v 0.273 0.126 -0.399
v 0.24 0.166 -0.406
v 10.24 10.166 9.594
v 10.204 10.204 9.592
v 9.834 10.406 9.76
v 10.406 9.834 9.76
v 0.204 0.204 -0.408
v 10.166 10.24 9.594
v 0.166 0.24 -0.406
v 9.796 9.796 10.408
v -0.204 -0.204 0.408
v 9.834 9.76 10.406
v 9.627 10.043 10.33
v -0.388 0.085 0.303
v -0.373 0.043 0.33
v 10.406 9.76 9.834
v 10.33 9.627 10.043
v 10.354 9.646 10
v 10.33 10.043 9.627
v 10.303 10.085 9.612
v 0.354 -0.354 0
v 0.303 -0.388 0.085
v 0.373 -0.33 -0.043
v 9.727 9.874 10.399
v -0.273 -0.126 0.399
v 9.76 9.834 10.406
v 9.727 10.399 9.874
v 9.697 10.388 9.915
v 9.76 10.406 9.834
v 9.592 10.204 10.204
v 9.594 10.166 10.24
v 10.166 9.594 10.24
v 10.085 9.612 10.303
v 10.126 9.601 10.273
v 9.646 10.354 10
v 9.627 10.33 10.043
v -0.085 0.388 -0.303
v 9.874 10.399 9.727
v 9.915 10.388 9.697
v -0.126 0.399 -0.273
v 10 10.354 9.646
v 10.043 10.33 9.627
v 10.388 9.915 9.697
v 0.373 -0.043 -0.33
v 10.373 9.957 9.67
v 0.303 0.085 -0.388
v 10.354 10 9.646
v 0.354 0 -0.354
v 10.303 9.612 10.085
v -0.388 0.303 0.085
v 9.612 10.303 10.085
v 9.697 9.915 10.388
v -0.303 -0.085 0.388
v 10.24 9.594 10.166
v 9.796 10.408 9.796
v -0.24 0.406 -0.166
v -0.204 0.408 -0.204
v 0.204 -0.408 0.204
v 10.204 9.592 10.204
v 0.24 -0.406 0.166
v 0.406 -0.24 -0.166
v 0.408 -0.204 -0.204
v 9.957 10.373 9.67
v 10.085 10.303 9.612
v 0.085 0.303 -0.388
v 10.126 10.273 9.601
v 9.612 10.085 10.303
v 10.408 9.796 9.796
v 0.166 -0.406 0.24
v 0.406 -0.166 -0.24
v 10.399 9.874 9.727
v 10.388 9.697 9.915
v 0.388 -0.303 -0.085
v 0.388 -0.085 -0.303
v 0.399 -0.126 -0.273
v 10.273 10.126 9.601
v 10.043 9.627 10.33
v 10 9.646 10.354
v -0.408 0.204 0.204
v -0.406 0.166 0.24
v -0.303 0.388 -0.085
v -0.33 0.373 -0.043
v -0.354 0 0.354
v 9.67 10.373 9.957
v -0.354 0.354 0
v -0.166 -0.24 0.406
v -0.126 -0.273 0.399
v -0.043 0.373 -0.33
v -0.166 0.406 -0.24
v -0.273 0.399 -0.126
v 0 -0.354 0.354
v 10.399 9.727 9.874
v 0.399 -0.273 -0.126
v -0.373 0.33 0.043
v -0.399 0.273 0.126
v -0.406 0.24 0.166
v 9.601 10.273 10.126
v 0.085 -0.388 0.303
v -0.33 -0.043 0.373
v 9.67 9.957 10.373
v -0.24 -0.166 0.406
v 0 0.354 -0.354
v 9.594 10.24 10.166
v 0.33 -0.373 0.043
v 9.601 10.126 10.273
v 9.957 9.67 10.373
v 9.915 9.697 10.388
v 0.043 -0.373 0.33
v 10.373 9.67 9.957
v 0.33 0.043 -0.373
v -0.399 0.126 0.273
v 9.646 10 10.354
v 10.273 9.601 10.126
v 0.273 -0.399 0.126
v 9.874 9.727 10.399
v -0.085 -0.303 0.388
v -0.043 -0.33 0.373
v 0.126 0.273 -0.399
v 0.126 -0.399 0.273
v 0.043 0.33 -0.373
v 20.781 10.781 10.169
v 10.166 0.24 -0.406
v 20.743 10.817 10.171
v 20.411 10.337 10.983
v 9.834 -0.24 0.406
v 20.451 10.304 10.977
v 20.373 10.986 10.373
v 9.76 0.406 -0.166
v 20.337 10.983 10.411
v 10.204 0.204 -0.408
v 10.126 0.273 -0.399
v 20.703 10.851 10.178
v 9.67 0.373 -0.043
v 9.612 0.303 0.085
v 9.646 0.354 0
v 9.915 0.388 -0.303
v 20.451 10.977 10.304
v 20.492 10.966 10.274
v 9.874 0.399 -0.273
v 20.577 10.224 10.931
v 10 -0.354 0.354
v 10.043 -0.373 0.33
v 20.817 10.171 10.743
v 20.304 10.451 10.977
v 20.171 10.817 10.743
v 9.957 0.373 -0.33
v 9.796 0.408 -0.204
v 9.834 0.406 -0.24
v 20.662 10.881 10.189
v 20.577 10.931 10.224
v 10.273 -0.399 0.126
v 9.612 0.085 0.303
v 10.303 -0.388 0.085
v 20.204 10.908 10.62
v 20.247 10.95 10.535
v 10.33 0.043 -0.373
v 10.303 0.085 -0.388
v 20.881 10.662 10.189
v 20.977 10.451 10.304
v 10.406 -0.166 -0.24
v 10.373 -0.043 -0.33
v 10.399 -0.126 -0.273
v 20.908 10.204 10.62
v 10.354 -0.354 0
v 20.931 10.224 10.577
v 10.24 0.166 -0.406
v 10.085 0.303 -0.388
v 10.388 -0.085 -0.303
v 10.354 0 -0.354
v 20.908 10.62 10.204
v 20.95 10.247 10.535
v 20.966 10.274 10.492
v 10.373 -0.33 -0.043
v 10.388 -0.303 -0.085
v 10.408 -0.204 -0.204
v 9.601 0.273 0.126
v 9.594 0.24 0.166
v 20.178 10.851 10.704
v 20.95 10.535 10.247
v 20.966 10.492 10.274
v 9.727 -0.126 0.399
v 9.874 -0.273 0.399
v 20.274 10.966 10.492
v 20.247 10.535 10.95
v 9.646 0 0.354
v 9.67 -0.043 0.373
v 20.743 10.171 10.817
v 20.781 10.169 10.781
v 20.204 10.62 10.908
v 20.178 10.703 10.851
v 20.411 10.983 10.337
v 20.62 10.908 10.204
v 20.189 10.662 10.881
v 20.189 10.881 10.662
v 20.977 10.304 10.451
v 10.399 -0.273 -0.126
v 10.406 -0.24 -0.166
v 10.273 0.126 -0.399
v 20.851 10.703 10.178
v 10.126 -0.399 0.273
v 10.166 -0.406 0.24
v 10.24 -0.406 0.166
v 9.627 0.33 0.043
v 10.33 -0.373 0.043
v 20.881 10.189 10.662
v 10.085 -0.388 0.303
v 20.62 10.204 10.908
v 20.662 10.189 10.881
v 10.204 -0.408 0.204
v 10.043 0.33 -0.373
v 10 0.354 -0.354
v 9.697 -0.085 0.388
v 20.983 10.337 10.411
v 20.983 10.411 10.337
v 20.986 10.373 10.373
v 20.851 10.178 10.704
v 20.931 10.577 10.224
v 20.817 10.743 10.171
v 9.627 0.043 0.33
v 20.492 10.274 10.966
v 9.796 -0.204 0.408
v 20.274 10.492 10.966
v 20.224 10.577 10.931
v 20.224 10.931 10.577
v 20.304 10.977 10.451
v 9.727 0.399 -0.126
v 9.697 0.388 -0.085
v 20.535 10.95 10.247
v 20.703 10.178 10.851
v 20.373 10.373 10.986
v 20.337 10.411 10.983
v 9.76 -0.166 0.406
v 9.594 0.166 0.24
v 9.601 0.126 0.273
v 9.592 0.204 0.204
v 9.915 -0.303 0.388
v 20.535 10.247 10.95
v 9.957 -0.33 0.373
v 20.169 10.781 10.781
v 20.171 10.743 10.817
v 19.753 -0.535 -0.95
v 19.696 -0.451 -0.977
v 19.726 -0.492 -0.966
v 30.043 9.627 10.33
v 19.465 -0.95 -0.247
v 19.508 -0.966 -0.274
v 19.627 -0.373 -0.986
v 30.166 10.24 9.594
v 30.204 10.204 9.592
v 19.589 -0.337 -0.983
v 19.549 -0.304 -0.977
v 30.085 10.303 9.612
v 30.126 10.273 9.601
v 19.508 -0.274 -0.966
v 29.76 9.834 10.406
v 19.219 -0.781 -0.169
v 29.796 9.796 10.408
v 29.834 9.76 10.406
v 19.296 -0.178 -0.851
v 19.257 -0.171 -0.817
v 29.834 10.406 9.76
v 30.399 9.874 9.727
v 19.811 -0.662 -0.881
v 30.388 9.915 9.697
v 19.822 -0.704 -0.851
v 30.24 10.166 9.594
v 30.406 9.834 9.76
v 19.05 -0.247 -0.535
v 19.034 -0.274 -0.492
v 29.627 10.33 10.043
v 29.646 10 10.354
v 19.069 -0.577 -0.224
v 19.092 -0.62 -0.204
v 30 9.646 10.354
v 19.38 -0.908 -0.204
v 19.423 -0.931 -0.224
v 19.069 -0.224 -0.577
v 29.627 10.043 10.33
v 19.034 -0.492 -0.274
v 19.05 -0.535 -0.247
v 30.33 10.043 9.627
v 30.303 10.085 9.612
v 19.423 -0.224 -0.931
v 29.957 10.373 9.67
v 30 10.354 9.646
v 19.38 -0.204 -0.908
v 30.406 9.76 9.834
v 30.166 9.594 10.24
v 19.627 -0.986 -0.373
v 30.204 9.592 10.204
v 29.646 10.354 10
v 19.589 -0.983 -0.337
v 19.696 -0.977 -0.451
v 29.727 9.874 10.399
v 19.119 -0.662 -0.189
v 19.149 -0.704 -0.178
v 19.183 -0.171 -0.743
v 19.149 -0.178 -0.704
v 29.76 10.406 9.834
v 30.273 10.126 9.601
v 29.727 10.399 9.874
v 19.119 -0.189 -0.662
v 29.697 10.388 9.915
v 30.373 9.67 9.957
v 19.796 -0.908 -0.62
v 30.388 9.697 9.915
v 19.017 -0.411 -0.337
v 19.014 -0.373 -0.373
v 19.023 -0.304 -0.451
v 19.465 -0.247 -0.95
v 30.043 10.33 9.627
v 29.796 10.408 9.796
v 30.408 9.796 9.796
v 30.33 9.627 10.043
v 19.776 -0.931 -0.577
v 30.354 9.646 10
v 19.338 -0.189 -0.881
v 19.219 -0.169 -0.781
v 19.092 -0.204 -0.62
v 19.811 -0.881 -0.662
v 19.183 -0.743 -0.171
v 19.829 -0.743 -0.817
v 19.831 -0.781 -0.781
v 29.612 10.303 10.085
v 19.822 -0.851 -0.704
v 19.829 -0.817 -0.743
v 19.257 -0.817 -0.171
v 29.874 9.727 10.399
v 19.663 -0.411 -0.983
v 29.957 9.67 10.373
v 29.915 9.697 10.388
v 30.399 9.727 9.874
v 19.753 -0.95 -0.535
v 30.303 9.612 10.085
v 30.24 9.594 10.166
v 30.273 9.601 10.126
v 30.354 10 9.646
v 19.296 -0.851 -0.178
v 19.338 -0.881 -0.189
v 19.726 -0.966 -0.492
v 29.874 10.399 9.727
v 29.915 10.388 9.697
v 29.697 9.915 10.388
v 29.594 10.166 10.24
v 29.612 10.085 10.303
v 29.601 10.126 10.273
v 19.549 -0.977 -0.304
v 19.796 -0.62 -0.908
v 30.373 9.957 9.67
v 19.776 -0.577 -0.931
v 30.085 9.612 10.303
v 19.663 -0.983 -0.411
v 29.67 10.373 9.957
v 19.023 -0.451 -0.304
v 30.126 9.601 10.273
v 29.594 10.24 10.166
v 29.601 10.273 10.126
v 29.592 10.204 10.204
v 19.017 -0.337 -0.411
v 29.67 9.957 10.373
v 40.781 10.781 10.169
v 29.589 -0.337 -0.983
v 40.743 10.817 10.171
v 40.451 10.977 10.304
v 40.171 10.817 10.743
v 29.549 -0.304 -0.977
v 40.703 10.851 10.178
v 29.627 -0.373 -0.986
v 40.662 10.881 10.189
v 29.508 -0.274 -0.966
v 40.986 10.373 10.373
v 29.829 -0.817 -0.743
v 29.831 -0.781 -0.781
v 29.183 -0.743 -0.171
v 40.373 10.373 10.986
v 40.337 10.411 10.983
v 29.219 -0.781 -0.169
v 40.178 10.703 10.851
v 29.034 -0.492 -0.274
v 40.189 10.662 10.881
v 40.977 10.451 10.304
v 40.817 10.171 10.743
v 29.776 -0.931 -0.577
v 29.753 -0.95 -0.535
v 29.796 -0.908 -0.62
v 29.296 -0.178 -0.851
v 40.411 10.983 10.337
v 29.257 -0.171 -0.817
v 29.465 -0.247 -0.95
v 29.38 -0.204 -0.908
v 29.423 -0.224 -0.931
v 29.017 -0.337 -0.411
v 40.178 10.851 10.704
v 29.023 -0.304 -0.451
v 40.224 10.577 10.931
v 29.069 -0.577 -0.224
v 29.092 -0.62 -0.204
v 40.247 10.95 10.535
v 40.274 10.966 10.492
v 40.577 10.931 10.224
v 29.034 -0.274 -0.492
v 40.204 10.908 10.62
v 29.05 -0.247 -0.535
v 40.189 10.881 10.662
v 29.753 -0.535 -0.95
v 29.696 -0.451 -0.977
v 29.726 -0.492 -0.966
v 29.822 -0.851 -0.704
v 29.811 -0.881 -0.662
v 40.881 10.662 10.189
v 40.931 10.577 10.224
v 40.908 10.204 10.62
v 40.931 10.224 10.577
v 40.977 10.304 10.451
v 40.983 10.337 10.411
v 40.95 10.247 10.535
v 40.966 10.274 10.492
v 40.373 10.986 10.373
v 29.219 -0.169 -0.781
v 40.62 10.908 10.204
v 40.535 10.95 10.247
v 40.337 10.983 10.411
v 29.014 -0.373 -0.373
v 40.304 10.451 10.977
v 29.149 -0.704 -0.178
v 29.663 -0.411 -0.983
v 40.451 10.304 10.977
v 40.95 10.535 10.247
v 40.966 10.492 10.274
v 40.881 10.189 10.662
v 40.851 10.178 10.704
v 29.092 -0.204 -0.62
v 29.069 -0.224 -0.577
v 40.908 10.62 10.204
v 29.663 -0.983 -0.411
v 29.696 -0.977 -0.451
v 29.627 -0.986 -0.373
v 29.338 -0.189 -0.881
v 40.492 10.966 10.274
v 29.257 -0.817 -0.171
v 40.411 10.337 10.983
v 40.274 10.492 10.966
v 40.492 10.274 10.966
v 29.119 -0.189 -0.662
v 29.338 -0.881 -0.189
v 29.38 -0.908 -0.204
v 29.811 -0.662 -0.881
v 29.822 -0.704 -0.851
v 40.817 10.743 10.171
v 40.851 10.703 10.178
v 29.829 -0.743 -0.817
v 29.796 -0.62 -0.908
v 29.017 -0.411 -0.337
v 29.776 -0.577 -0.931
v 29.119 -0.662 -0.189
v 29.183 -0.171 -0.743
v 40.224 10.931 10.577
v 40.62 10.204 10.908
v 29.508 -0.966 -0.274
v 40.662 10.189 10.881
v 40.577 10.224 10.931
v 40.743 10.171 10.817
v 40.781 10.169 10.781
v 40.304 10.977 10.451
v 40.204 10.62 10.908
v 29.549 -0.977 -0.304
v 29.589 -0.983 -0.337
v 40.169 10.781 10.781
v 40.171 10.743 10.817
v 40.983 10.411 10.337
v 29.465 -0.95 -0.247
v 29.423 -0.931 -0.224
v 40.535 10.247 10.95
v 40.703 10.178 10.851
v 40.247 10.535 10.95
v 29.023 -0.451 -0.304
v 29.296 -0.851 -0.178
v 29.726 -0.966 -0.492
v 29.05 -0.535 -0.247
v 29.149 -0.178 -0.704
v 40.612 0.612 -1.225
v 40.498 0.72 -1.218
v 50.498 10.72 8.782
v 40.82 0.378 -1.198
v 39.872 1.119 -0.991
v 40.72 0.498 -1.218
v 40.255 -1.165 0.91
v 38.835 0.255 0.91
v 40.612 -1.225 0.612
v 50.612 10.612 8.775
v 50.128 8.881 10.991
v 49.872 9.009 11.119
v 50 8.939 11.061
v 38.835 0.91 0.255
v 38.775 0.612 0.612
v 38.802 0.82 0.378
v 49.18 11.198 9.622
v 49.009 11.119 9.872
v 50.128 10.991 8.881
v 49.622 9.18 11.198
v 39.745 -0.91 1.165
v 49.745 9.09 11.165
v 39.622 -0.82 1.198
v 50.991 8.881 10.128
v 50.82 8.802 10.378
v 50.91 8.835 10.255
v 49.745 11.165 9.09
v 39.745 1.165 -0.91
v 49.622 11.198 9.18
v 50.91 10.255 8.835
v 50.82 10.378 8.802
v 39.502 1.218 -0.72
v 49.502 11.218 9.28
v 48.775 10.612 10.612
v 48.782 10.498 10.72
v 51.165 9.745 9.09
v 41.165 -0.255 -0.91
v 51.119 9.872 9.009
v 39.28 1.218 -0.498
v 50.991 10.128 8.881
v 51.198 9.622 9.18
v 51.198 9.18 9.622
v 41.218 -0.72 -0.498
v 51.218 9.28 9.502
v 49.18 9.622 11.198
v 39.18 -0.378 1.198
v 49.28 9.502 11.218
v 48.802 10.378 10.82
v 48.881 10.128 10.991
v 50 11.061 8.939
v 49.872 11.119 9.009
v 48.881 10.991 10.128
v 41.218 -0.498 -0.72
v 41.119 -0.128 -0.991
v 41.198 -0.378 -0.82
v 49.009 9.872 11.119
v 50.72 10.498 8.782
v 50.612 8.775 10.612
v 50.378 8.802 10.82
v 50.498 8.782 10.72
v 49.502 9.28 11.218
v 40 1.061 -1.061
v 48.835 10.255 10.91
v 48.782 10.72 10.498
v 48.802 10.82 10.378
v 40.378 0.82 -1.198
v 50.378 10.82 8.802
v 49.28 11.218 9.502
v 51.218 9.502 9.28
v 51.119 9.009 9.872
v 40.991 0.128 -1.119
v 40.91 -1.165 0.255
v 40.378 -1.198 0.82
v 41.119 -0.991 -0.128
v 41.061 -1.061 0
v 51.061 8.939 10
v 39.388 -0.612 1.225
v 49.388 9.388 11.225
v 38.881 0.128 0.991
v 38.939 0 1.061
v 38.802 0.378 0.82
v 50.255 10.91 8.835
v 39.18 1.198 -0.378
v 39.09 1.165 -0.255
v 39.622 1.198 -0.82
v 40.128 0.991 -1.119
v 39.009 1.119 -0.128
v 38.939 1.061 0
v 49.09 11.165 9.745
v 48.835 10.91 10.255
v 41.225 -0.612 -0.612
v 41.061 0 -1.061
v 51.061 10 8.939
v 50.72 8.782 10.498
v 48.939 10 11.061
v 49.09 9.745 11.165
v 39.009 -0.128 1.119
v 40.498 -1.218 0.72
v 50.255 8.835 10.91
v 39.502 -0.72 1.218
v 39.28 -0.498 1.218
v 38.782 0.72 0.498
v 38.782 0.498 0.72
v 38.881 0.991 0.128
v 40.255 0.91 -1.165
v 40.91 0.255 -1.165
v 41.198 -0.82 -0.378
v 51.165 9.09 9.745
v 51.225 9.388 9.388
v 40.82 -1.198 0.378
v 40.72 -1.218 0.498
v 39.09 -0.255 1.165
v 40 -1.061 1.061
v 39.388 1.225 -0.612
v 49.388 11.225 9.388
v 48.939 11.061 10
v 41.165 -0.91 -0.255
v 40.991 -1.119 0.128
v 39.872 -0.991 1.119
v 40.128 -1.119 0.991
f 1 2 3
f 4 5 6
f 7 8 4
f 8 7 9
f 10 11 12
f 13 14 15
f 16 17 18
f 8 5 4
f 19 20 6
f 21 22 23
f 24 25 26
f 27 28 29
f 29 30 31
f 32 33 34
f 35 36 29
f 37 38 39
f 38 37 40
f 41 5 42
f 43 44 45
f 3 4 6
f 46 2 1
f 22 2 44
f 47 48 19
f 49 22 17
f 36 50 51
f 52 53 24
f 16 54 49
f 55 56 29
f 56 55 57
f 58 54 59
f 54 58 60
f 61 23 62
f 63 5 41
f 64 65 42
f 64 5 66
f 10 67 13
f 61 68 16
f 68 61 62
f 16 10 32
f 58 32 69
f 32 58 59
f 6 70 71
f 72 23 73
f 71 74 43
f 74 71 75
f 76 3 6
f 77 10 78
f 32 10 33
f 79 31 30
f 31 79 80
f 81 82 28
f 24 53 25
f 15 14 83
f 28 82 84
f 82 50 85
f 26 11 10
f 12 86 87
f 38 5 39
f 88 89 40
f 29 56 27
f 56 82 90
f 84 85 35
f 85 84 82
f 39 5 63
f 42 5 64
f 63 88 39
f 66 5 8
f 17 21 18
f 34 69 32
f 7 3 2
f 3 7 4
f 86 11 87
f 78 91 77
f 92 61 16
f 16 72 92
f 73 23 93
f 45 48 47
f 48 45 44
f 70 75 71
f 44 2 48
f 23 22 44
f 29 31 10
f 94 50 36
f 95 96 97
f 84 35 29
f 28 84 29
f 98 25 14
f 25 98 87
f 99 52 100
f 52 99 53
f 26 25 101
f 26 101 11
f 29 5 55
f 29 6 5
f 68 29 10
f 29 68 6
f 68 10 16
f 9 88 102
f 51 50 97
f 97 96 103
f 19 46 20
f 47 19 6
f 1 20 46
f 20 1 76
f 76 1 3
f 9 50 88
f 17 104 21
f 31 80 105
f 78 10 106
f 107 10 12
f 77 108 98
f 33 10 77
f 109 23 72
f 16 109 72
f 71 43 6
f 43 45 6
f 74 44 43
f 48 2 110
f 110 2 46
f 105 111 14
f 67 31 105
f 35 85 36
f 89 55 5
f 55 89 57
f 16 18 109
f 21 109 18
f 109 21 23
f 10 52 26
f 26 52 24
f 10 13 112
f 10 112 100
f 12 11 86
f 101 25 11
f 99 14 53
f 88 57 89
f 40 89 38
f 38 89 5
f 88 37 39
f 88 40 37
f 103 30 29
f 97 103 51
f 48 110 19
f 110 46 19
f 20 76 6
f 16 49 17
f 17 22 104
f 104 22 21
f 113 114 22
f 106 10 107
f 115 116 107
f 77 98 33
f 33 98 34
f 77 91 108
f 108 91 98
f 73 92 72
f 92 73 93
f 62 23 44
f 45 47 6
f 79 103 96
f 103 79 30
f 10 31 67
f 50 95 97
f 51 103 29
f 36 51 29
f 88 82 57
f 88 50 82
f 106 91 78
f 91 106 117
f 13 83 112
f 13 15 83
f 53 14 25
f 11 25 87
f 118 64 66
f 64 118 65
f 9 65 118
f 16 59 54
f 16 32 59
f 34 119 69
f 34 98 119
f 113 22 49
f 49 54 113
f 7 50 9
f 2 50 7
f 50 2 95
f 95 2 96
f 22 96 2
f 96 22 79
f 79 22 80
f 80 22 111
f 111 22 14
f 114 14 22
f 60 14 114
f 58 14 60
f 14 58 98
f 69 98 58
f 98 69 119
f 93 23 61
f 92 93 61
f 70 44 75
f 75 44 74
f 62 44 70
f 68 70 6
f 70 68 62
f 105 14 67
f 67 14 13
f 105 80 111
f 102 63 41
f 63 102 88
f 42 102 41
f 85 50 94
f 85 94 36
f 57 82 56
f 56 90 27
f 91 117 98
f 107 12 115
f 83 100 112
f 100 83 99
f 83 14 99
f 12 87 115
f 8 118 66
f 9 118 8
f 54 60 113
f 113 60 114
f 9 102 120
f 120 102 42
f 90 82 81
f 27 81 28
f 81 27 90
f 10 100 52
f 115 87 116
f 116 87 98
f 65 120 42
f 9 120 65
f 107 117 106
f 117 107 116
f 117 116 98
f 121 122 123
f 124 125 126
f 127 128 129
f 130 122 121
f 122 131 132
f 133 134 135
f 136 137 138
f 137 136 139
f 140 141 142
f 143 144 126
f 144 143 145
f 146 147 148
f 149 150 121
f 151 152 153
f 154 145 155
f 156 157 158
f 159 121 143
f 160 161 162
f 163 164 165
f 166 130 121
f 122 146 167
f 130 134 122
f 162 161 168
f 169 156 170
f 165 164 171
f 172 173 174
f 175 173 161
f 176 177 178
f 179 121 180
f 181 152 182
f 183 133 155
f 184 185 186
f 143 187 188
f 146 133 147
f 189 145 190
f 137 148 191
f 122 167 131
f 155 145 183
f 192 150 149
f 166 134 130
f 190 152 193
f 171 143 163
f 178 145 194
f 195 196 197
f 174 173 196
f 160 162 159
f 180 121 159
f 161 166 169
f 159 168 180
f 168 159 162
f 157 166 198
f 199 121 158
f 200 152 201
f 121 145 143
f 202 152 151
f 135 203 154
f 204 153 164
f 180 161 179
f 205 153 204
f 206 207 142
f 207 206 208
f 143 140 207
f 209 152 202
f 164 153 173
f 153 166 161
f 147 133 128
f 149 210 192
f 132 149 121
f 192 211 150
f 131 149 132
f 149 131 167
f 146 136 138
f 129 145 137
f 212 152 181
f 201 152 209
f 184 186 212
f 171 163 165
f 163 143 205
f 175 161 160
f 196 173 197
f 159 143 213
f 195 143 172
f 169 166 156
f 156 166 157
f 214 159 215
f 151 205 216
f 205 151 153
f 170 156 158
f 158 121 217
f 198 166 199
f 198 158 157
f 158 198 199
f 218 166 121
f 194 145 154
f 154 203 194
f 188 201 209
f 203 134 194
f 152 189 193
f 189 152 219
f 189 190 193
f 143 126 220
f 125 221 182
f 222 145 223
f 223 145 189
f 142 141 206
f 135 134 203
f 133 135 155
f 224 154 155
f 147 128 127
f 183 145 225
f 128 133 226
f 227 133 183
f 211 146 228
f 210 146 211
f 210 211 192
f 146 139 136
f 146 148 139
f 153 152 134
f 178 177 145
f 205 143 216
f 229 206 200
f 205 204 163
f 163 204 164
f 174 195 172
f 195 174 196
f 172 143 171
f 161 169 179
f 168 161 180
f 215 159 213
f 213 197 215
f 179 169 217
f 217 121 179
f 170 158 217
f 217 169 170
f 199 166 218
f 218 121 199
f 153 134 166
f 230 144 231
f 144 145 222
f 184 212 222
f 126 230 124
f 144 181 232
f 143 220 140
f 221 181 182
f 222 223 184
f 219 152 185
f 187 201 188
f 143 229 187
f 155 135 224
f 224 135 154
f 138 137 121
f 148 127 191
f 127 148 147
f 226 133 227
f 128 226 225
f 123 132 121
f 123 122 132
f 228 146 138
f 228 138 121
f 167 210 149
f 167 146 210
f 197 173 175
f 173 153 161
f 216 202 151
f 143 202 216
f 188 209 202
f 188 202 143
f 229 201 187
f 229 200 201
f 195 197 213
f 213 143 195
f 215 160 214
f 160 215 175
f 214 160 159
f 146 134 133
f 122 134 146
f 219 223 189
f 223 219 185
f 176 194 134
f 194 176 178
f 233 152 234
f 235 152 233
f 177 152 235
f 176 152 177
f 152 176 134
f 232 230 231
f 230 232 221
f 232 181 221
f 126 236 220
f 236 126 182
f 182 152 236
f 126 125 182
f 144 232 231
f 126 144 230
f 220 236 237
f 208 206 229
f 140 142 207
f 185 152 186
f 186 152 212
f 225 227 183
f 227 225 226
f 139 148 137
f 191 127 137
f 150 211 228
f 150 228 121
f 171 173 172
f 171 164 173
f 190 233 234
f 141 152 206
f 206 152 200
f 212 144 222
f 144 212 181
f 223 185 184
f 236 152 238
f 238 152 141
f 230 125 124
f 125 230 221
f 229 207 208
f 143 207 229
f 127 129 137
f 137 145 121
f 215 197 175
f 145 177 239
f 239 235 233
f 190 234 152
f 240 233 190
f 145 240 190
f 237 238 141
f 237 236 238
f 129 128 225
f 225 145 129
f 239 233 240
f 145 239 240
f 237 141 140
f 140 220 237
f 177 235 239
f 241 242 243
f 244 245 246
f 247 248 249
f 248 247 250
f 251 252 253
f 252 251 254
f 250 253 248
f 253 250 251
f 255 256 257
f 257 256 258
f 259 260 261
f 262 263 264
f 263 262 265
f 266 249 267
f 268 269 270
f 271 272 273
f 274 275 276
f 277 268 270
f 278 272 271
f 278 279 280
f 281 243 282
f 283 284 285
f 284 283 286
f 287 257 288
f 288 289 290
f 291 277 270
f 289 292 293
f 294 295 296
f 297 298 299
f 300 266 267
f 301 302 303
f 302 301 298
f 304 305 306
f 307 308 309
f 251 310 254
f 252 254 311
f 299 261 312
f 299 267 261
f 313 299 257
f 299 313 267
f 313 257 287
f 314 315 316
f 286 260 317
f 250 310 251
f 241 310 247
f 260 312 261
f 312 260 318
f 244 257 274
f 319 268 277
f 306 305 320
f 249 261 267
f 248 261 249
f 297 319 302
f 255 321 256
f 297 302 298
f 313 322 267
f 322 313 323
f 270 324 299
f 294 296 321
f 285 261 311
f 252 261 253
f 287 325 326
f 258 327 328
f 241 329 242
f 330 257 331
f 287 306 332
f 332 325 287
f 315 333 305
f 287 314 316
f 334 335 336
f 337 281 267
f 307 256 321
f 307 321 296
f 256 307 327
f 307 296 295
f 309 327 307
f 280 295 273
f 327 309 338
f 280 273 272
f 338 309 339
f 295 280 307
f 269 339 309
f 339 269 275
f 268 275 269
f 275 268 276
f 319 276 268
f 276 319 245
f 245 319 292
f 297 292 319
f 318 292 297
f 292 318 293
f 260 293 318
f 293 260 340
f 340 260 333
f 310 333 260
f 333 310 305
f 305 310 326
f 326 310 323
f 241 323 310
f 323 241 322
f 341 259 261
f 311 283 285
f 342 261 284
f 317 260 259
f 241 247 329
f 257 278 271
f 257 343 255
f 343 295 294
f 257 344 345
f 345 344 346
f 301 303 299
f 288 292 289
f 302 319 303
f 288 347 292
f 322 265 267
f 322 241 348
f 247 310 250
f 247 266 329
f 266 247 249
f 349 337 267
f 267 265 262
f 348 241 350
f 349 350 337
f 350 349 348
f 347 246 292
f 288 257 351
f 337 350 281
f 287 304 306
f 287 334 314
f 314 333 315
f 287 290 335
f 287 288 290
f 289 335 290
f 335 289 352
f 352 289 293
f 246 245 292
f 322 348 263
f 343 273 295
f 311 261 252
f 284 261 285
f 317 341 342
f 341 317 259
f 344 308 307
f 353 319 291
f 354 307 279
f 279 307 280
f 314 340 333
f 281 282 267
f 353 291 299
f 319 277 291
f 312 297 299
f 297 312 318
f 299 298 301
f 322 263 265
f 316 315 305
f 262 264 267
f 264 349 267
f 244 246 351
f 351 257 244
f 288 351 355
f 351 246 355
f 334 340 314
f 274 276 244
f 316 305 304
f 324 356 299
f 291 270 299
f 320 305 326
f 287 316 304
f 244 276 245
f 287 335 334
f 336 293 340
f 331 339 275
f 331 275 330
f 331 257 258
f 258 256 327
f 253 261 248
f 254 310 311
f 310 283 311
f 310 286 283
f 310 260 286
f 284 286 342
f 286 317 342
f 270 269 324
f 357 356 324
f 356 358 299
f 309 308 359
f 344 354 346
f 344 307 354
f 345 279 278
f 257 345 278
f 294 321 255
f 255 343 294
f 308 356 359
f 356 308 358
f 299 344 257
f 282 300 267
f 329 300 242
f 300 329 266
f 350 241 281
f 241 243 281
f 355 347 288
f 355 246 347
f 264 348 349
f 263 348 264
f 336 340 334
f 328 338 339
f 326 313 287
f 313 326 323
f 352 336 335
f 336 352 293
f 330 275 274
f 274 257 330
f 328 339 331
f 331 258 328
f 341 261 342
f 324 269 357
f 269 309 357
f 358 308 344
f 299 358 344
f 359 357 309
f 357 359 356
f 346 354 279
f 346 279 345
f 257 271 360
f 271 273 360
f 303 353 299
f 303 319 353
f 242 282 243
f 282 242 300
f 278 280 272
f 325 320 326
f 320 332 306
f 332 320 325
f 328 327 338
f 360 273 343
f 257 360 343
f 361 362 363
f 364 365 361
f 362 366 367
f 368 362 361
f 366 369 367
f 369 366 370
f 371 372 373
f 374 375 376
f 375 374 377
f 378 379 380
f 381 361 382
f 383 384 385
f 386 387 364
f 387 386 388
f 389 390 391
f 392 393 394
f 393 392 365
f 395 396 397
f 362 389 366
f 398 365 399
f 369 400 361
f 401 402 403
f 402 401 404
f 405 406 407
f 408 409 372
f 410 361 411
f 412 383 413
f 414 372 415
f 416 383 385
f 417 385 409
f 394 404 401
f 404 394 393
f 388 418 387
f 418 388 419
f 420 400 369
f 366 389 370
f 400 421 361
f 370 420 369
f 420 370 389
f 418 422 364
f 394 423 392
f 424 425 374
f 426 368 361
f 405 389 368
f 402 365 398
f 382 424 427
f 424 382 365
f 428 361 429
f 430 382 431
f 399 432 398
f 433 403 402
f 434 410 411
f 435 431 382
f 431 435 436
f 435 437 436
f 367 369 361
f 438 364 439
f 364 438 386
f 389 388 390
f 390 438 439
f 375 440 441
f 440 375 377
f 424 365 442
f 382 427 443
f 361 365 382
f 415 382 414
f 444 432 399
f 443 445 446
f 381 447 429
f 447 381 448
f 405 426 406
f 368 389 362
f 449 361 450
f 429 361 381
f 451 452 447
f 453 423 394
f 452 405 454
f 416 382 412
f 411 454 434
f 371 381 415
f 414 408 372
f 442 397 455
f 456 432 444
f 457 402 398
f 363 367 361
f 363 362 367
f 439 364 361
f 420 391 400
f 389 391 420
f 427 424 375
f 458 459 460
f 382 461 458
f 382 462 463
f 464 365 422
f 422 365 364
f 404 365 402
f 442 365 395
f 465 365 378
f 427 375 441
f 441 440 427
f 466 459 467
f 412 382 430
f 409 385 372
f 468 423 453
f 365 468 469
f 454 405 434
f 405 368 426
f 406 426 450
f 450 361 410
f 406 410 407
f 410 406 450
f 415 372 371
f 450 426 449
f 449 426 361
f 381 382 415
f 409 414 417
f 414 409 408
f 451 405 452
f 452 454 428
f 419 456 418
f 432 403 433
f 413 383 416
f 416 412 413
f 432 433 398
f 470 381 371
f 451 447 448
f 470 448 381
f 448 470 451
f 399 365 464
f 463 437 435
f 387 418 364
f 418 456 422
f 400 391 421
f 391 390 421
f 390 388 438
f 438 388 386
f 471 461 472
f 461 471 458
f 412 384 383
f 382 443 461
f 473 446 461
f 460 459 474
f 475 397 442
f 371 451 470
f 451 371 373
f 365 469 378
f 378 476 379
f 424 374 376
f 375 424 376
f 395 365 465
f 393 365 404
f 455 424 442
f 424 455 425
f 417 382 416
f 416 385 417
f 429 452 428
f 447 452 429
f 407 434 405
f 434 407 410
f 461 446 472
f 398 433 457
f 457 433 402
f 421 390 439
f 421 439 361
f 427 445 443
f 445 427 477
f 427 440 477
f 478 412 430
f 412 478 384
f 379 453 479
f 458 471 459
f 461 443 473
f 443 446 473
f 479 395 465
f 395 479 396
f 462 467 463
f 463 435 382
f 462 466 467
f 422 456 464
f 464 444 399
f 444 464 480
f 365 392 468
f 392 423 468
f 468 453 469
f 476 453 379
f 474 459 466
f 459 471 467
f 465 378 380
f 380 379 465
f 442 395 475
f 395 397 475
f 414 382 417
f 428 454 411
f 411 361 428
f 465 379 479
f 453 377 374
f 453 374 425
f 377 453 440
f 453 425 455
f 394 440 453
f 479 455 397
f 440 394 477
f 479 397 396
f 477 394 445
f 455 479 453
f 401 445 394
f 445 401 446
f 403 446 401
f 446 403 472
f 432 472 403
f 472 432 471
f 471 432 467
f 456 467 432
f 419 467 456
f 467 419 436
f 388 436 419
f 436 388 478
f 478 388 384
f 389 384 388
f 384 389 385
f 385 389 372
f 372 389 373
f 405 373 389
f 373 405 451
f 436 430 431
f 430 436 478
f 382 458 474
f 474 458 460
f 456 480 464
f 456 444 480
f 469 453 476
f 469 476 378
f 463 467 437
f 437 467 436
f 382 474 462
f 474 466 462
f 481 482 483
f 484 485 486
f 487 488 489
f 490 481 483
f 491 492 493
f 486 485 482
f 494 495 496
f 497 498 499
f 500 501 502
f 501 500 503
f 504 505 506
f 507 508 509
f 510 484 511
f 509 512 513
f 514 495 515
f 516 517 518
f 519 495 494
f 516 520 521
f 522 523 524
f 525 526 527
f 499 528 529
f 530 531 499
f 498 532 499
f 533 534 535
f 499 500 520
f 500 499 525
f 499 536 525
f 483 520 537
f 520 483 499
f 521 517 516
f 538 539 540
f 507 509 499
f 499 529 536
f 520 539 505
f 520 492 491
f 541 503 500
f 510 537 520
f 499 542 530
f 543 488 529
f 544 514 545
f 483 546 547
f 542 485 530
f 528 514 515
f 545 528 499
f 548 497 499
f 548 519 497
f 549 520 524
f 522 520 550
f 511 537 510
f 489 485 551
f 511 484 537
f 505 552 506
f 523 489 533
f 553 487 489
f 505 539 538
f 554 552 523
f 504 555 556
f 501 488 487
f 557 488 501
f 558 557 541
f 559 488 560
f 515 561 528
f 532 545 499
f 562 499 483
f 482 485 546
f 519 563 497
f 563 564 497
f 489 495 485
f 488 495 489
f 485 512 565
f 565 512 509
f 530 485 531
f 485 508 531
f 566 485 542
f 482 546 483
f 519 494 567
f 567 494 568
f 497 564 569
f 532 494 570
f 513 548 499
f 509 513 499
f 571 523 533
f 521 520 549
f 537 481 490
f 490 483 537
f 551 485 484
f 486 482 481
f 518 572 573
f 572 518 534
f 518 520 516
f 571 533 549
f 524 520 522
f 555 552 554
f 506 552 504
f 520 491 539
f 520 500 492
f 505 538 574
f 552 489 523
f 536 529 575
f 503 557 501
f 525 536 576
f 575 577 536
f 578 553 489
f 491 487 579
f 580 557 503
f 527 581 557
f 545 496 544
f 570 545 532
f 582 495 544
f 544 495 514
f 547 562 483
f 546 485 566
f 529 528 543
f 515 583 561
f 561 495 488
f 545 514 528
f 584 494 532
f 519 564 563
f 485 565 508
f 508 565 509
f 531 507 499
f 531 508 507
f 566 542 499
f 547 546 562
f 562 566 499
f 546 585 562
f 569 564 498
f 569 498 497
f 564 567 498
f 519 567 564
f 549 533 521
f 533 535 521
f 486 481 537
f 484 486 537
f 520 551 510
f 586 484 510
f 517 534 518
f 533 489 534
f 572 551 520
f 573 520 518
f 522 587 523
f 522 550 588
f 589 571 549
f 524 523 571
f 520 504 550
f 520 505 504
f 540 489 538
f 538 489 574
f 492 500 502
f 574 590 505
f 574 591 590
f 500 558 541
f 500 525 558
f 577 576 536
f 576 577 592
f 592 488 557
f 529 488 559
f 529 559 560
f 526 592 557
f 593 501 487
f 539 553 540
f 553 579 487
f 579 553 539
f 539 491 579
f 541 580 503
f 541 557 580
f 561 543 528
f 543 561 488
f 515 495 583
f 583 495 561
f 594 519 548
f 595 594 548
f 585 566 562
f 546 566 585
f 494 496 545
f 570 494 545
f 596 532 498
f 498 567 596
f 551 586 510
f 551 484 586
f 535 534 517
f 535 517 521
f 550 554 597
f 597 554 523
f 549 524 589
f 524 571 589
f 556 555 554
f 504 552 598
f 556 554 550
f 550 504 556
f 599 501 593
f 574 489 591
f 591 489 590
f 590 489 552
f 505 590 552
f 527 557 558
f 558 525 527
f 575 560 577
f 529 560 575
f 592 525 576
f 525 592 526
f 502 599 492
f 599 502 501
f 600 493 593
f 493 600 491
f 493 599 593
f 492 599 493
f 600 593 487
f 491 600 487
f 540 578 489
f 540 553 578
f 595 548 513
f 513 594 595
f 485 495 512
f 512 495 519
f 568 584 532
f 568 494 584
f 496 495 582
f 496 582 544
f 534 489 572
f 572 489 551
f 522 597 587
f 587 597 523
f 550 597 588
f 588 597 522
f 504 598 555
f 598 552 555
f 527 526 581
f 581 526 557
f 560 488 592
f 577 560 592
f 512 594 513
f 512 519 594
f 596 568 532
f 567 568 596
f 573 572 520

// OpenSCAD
// Unit of length: Unit.MM
$fn = 60;

union()
{
   translate(v = [0.0, 0.0, 0.0])
   {
      rotate(a = [0.0, 54.7356, 45.0])
      {
         cylinder(h = 17.3205, d = 1.0, center = false);
      }
   }
   translate(v = [10.0, 0.0, 0.0])
   {
      translate(v = [0.0, 0.0, 0.0])
      {
         rotate(a = [0.0, 54.7356, 45.0])
         {
            cylinder(h = 18.3205, d = 1.0, center = false);
         }
      }
   }
   translate(v = [20.0, 0.0, 0.0])
   {
      translate(v = [0.0, 0.0, 0.0])
      {
         rotate(a = [0.0, 54.7356, 45.0])
         {
            translate(v = [0.0, 0.0, -1.0])
            {
               cylinder(h = 18.3205, d = 1.0, center = false);
            }
         }
      }
   }
   translate(v = [30.0, 0.0, 0.0])
   {
      translate(v = [0.0, 0.0, 0.0])
      {
         rotate(a = [0.0, 54.7356, 45.0])
         {
            translate(v = [0.0, 0.0, -1.0])
            {
               cylinder(h = 19.3205, d = 1.0, center = false);
            }
         }
      }
   }
   translate(v = [40.0, 0.0, 0.0])
   {
      translate(v = [0.0, 0.0, 0.0])
      {
         rotate(a = [0.0, 54.7356, 45.0])
         {
            cylinder(h = 17.3205, d = 3.0, center = false);
         }
      }
   }
   %union()
   {
      translate(v = [0.0, 0.0, 0.0])
      {
         cube(size = 10.0, center = false);
      }
   }
   translate(v = [10.0, 0.0, 0.0])
   {
      %union()
      {
         translate(v = [0.0, 0.0, 0.0])
         {
            cube(size = 10.0, center = false);
         }
      }
   }
   translate(v = [20.0, 0.0, 0.0])
   {
      %union()
      {
         translate(v = [0.0, 0.0, 0.0])
         {
            cube(size = 10.0, center = false);
         }
      }
   }
   translate(v = [30.0, 0.0, 0.0])
   {
      %union()
      {
         translate(v = [0.0, 0.0, 0.0])
         {
            cube(size = 10.0, center = false);
         }
      }
   }
   translate(v = [40.0, 0.0, 0.0])
   {
      %union()
      {
         translate(v = [0.0, 0.0, 0.0])
         {
            cube(size = 10.0, center = false);
         }
      }
   }
}
